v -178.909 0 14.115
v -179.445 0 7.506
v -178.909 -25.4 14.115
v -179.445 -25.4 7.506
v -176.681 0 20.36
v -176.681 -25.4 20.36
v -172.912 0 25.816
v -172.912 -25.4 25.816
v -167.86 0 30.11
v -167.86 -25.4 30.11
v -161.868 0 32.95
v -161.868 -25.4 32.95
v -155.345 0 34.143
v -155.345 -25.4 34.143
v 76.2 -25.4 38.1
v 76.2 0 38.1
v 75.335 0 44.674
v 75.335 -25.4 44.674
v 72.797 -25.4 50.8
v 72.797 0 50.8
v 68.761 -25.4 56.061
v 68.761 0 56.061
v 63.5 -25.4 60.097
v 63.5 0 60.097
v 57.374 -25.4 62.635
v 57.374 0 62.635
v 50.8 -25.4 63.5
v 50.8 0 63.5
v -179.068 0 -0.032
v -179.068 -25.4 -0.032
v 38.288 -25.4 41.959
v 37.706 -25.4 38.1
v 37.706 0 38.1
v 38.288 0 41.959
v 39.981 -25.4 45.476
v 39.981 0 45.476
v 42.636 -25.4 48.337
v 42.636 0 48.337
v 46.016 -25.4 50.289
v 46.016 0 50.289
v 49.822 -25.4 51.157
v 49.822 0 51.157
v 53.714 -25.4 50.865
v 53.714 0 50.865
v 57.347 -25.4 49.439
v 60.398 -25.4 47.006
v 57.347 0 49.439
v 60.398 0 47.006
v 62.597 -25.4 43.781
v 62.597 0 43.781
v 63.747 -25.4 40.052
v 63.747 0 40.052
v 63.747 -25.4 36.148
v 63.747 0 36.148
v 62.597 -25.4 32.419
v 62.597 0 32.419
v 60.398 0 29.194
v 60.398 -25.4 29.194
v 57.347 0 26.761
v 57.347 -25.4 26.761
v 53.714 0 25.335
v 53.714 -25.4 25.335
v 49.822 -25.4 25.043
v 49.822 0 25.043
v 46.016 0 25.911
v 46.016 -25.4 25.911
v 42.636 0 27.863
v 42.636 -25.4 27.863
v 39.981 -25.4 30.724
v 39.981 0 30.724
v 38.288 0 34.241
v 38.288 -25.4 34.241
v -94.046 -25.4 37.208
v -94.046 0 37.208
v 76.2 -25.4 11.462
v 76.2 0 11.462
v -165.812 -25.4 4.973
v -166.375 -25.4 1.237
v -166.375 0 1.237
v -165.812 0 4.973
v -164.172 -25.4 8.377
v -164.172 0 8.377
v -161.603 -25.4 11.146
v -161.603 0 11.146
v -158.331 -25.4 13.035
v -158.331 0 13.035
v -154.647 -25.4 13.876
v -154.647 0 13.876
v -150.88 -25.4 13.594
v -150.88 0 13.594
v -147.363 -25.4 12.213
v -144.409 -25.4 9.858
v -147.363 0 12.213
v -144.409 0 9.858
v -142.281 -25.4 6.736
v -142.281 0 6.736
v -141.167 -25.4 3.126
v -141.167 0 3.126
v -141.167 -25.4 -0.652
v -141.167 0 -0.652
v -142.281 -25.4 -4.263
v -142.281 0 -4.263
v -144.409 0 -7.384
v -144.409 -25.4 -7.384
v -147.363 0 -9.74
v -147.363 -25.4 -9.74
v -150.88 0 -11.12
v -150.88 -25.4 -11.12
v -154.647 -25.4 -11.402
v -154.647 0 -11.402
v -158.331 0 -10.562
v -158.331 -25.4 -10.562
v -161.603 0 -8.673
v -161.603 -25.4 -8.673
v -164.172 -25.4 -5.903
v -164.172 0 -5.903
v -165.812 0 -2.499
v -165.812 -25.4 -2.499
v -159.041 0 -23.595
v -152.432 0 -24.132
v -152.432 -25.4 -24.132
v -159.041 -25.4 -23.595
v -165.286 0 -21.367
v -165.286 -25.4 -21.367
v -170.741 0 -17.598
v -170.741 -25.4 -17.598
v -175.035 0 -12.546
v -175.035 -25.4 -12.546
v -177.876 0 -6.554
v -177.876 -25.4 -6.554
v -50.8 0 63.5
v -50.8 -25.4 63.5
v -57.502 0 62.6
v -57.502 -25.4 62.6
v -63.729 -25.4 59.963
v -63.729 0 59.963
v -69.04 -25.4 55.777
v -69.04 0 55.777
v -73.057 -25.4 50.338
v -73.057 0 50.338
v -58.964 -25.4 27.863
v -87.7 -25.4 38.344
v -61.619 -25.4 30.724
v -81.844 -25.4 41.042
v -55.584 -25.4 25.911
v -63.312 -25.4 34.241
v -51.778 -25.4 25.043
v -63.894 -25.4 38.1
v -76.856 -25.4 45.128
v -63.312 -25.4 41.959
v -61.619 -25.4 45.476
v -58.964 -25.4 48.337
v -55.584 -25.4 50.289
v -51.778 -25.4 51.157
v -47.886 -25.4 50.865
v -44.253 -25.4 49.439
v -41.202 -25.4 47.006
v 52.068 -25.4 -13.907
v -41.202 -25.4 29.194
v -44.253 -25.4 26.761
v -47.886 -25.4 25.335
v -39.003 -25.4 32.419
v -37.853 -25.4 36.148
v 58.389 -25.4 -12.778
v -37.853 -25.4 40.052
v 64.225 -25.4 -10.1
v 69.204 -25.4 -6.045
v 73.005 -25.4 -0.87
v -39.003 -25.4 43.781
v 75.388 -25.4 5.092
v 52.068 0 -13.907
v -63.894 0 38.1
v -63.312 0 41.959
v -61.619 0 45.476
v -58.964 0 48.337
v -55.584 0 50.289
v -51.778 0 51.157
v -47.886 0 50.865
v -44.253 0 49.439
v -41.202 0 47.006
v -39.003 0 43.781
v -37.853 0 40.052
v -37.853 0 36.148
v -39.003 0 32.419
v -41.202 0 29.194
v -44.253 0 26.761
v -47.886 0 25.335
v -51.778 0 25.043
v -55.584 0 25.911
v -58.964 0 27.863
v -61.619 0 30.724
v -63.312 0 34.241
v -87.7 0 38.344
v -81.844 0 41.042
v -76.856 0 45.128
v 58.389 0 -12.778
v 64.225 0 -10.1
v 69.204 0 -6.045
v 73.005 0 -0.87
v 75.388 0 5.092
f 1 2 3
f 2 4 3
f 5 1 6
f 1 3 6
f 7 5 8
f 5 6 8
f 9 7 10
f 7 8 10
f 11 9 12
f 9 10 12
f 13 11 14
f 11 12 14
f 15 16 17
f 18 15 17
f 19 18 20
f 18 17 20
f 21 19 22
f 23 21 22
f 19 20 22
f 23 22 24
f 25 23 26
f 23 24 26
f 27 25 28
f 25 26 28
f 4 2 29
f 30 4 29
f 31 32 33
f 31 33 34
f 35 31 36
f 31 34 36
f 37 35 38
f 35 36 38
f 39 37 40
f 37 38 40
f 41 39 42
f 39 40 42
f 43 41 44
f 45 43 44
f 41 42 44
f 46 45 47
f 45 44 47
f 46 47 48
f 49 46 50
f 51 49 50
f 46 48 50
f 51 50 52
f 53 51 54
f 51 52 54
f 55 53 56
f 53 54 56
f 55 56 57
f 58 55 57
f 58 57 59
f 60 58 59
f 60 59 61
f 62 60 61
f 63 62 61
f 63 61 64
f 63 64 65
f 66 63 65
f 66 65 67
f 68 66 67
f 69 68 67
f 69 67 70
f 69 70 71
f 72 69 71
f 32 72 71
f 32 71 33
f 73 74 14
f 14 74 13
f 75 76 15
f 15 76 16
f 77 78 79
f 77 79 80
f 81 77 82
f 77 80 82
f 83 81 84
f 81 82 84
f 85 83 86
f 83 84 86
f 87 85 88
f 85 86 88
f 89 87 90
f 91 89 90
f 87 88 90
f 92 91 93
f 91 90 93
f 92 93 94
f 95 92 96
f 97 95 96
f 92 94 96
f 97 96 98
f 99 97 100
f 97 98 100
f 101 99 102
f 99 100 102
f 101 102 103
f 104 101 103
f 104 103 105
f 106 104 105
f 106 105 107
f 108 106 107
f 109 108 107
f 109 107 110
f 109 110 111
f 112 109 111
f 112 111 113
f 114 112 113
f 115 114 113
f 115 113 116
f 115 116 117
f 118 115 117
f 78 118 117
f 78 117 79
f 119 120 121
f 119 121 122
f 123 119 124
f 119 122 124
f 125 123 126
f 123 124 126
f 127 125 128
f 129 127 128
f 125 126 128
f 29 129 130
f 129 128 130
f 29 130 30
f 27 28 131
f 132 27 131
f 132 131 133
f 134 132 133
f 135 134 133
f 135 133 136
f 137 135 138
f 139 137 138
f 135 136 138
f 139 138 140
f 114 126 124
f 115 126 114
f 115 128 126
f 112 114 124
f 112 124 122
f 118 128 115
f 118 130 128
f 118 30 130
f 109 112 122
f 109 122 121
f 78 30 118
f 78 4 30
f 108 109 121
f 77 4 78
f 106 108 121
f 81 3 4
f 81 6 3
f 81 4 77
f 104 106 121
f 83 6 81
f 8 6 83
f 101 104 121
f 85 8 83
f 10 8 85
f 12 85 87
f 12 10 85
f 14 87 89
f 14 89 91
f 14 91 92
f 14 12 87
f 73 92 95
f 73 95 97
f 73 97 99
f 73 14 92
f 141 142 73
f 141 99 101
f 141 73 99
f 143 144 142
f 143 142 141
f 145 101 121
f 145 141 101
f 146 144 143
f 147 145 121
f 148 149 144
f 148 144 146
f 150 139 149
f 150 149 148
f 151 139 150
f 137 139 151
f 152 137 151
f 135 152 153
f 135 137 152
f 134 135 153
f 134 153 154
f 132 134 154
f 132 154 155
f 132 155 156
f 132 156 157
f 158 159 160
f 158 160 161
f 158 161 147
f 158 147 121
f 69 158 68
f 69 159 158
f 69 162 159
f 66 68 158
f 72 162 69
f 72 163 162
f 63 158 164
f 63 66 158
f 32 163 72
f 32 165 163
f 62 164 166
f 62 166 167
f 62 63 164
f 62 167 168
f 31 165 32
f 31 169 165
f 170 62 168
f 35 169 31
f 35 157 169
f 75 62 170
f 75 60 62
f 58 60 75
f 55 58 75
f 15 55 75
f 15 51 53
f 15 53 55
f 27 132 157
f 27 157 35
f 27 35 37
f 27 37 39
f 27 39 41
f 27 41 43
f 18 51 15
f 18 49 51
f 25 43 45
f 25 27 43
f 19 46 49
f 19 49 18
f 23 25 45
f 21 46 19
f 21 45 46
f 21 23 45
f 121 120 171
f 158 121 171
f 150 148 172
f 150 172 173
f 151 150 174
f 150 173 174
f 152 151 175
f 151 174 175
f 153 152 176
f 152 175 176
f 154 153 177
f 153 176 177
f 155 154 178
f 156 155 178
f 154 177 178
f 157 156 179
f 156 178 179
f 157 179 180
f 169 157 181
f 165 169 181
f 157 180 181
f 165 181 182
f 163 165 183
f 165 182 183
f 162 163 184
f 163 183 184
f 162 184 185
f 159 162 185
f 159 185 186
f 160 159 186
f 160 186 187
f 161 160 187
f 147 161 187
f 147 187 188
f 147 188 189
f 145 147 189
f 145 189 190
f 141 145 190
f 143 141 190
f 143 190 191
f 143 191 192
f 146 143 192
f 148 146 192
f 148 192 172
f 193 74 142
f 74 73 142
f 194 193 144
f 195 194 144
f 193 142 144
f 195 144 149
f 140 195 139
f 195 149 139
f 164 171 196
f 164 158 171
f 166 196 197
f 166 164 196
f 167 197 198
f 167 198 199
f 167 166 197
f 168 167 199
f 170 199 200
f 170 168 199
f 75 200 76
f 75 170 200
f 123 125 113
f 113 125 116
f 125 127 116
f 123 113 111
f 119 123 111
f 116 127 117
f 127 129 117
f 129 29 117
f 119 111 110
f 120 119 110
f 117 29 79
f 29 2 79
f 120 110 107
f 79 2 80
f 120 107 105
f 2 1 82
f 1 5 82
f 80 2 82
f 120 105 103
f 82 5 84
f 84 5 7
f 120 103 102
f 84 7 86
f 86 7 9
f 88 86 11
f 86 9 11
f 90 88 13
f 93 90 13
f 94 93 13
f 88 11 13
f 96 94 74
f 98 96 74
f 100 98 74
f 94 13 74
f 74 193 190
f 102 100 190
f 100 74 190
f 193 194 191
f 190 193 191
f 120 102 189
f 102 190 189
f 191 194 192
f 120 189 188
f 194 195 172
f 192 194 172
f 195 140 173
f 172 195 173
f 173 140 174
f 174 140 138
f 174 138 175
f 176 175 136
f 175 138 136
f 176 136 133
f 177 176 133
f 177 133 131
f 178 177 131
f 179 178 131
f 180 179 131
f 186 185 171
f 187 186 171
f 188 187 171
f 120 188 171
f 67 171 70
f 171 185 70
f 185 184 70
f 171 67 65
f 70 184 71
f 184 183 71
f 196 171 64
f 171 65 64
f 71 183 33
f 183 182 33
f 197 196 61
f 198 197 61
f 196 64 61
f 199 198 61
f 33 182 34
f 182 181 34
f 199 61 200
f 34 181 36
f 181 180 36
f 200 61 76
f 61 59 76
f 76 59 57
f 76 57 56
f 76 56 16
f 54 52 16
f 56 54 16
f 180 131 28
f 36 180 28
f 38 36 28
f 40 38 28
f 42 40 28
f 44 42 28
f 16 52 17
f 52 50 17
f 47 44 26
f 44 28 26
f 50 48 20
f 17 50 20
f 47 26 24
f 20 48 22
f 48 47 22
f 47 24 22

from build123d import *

# Parameters (mm, degrees)
F1_DEPTH = 25.4
F3_D     = 26.1874
F4_R     = 25.4
F7_D     = 25.3492


# Not quite as in the source:
# - a feature names something its author has since deleted; it is built from what else it names


with BuildPart() as f1:
    # F0 (on Front) → F1 (new body)
    with BuildSketch(Plane.XZ):
        Polygon((-177.8, -25.4), (76.2, -12.7), (-76.2, -12.7), (-76.2, 12.7), (-76.2, 38.1), (-180.7137157107, 32.8743142145), align=None)
        Polygon((-76.2, -12.7), (76.2, -12.7), (76.2, 12.7), (50.8, 12.7), (-50.7999999312, 12.7), (-76.2, 12.7), align=None)
        with BuildLine():
            Line((50.8, 12.7), (76.2, 12.7))
            Line((76.2, 12.7), (76.2, 38.1))
            ThreePointArc((76.2, 38.1), (68.7605122421, 20.1394877579), (50.8, 12.7))
        make_face()
        with BuildLine():
            Line((-76.2, 38.1), (-76.2, 12.7))
            Line((-76.2, 12.7), (-50.7999999312, 12.7))
            ThreePointArc((-50.7999999312, 12.7), (-68.7605122178, 20.1394877335), (-76.2, 38.1))
        make_face()
        with BuildLine():
            Line((-50.7999999312, 12.7), (50.8, 12.7))
            ThreePointArc((50.8, 12.7), (25.4, 38.1), (50.8, 63.5))
            Line((50.8, 63.5), (-50.8, 63.5))
            ThreePointArc((-50.8, 63.5), (-32.8394877579, 56.0605122421), (-25.4, 38.1))
            ThreePointArc((-25.4, 38.1), (-32.8394877335, 20.1394877822), (-50.7999999312, 12.7))
        make_face()
        with BuildLine():
            ThreePointArc((50.8, 63.5), (25.4, 38.1), (50.8, 12.7))
            ThreePointArc((50.8, 12.7), (68.7605122421, 20.1394877579), (76.2, 38.1))
            ThreePointArc((76.2, 38.1), (68.7605122421, 56.0605122421), (50.8, 63.5))
        make_face()
        with BuildLine():
            ThreePointArc((-76.2, 38.1), (-68.7605122178, 20.1394877335), (-50.7999999312, 12.7))
            ThreePointArc((-50.7999999312, 12.7), (-32.8394877335, 20.1394877822), (-25.4, 38.1))
            ThreePointArc((-25.4, 38.1), (-32.8394877579, 56.0605122421), (-50.8, 63.5))
            ThreePointArc((-50.8, 63.5), (-68.7605122421, 56.0605122421), (-76.2, 38.1))
        make_face()
    extrude(amount=F1_DEPTH)

    # F3 (through all)
    with Locations(Plane.XZ.offset(25.4)):
        with Locations((-50.8, 38.1), (50.8, 38.1)):
            Hole(F3_D / 2)

    # F4
    f4_edges = [f1.edges().sort_by_distance(p)[0] for p in [
        (76.2, -12.7, -12.7),
        (-177.8, -12.7, -25.4),
        (-76.2, -12.7, 38.1),
        (-180.713716, -12.7, 32.874314),
    ]]
    fillet(f4_edges, radius=F4_R)

    # F7 (through all)
    with Locations(Plane.XZ.offset(25.4)):
        with Locations((-153.7001060629, 1.2367248779)):
            Hole(F7_D / 2)


solid = f1.part
